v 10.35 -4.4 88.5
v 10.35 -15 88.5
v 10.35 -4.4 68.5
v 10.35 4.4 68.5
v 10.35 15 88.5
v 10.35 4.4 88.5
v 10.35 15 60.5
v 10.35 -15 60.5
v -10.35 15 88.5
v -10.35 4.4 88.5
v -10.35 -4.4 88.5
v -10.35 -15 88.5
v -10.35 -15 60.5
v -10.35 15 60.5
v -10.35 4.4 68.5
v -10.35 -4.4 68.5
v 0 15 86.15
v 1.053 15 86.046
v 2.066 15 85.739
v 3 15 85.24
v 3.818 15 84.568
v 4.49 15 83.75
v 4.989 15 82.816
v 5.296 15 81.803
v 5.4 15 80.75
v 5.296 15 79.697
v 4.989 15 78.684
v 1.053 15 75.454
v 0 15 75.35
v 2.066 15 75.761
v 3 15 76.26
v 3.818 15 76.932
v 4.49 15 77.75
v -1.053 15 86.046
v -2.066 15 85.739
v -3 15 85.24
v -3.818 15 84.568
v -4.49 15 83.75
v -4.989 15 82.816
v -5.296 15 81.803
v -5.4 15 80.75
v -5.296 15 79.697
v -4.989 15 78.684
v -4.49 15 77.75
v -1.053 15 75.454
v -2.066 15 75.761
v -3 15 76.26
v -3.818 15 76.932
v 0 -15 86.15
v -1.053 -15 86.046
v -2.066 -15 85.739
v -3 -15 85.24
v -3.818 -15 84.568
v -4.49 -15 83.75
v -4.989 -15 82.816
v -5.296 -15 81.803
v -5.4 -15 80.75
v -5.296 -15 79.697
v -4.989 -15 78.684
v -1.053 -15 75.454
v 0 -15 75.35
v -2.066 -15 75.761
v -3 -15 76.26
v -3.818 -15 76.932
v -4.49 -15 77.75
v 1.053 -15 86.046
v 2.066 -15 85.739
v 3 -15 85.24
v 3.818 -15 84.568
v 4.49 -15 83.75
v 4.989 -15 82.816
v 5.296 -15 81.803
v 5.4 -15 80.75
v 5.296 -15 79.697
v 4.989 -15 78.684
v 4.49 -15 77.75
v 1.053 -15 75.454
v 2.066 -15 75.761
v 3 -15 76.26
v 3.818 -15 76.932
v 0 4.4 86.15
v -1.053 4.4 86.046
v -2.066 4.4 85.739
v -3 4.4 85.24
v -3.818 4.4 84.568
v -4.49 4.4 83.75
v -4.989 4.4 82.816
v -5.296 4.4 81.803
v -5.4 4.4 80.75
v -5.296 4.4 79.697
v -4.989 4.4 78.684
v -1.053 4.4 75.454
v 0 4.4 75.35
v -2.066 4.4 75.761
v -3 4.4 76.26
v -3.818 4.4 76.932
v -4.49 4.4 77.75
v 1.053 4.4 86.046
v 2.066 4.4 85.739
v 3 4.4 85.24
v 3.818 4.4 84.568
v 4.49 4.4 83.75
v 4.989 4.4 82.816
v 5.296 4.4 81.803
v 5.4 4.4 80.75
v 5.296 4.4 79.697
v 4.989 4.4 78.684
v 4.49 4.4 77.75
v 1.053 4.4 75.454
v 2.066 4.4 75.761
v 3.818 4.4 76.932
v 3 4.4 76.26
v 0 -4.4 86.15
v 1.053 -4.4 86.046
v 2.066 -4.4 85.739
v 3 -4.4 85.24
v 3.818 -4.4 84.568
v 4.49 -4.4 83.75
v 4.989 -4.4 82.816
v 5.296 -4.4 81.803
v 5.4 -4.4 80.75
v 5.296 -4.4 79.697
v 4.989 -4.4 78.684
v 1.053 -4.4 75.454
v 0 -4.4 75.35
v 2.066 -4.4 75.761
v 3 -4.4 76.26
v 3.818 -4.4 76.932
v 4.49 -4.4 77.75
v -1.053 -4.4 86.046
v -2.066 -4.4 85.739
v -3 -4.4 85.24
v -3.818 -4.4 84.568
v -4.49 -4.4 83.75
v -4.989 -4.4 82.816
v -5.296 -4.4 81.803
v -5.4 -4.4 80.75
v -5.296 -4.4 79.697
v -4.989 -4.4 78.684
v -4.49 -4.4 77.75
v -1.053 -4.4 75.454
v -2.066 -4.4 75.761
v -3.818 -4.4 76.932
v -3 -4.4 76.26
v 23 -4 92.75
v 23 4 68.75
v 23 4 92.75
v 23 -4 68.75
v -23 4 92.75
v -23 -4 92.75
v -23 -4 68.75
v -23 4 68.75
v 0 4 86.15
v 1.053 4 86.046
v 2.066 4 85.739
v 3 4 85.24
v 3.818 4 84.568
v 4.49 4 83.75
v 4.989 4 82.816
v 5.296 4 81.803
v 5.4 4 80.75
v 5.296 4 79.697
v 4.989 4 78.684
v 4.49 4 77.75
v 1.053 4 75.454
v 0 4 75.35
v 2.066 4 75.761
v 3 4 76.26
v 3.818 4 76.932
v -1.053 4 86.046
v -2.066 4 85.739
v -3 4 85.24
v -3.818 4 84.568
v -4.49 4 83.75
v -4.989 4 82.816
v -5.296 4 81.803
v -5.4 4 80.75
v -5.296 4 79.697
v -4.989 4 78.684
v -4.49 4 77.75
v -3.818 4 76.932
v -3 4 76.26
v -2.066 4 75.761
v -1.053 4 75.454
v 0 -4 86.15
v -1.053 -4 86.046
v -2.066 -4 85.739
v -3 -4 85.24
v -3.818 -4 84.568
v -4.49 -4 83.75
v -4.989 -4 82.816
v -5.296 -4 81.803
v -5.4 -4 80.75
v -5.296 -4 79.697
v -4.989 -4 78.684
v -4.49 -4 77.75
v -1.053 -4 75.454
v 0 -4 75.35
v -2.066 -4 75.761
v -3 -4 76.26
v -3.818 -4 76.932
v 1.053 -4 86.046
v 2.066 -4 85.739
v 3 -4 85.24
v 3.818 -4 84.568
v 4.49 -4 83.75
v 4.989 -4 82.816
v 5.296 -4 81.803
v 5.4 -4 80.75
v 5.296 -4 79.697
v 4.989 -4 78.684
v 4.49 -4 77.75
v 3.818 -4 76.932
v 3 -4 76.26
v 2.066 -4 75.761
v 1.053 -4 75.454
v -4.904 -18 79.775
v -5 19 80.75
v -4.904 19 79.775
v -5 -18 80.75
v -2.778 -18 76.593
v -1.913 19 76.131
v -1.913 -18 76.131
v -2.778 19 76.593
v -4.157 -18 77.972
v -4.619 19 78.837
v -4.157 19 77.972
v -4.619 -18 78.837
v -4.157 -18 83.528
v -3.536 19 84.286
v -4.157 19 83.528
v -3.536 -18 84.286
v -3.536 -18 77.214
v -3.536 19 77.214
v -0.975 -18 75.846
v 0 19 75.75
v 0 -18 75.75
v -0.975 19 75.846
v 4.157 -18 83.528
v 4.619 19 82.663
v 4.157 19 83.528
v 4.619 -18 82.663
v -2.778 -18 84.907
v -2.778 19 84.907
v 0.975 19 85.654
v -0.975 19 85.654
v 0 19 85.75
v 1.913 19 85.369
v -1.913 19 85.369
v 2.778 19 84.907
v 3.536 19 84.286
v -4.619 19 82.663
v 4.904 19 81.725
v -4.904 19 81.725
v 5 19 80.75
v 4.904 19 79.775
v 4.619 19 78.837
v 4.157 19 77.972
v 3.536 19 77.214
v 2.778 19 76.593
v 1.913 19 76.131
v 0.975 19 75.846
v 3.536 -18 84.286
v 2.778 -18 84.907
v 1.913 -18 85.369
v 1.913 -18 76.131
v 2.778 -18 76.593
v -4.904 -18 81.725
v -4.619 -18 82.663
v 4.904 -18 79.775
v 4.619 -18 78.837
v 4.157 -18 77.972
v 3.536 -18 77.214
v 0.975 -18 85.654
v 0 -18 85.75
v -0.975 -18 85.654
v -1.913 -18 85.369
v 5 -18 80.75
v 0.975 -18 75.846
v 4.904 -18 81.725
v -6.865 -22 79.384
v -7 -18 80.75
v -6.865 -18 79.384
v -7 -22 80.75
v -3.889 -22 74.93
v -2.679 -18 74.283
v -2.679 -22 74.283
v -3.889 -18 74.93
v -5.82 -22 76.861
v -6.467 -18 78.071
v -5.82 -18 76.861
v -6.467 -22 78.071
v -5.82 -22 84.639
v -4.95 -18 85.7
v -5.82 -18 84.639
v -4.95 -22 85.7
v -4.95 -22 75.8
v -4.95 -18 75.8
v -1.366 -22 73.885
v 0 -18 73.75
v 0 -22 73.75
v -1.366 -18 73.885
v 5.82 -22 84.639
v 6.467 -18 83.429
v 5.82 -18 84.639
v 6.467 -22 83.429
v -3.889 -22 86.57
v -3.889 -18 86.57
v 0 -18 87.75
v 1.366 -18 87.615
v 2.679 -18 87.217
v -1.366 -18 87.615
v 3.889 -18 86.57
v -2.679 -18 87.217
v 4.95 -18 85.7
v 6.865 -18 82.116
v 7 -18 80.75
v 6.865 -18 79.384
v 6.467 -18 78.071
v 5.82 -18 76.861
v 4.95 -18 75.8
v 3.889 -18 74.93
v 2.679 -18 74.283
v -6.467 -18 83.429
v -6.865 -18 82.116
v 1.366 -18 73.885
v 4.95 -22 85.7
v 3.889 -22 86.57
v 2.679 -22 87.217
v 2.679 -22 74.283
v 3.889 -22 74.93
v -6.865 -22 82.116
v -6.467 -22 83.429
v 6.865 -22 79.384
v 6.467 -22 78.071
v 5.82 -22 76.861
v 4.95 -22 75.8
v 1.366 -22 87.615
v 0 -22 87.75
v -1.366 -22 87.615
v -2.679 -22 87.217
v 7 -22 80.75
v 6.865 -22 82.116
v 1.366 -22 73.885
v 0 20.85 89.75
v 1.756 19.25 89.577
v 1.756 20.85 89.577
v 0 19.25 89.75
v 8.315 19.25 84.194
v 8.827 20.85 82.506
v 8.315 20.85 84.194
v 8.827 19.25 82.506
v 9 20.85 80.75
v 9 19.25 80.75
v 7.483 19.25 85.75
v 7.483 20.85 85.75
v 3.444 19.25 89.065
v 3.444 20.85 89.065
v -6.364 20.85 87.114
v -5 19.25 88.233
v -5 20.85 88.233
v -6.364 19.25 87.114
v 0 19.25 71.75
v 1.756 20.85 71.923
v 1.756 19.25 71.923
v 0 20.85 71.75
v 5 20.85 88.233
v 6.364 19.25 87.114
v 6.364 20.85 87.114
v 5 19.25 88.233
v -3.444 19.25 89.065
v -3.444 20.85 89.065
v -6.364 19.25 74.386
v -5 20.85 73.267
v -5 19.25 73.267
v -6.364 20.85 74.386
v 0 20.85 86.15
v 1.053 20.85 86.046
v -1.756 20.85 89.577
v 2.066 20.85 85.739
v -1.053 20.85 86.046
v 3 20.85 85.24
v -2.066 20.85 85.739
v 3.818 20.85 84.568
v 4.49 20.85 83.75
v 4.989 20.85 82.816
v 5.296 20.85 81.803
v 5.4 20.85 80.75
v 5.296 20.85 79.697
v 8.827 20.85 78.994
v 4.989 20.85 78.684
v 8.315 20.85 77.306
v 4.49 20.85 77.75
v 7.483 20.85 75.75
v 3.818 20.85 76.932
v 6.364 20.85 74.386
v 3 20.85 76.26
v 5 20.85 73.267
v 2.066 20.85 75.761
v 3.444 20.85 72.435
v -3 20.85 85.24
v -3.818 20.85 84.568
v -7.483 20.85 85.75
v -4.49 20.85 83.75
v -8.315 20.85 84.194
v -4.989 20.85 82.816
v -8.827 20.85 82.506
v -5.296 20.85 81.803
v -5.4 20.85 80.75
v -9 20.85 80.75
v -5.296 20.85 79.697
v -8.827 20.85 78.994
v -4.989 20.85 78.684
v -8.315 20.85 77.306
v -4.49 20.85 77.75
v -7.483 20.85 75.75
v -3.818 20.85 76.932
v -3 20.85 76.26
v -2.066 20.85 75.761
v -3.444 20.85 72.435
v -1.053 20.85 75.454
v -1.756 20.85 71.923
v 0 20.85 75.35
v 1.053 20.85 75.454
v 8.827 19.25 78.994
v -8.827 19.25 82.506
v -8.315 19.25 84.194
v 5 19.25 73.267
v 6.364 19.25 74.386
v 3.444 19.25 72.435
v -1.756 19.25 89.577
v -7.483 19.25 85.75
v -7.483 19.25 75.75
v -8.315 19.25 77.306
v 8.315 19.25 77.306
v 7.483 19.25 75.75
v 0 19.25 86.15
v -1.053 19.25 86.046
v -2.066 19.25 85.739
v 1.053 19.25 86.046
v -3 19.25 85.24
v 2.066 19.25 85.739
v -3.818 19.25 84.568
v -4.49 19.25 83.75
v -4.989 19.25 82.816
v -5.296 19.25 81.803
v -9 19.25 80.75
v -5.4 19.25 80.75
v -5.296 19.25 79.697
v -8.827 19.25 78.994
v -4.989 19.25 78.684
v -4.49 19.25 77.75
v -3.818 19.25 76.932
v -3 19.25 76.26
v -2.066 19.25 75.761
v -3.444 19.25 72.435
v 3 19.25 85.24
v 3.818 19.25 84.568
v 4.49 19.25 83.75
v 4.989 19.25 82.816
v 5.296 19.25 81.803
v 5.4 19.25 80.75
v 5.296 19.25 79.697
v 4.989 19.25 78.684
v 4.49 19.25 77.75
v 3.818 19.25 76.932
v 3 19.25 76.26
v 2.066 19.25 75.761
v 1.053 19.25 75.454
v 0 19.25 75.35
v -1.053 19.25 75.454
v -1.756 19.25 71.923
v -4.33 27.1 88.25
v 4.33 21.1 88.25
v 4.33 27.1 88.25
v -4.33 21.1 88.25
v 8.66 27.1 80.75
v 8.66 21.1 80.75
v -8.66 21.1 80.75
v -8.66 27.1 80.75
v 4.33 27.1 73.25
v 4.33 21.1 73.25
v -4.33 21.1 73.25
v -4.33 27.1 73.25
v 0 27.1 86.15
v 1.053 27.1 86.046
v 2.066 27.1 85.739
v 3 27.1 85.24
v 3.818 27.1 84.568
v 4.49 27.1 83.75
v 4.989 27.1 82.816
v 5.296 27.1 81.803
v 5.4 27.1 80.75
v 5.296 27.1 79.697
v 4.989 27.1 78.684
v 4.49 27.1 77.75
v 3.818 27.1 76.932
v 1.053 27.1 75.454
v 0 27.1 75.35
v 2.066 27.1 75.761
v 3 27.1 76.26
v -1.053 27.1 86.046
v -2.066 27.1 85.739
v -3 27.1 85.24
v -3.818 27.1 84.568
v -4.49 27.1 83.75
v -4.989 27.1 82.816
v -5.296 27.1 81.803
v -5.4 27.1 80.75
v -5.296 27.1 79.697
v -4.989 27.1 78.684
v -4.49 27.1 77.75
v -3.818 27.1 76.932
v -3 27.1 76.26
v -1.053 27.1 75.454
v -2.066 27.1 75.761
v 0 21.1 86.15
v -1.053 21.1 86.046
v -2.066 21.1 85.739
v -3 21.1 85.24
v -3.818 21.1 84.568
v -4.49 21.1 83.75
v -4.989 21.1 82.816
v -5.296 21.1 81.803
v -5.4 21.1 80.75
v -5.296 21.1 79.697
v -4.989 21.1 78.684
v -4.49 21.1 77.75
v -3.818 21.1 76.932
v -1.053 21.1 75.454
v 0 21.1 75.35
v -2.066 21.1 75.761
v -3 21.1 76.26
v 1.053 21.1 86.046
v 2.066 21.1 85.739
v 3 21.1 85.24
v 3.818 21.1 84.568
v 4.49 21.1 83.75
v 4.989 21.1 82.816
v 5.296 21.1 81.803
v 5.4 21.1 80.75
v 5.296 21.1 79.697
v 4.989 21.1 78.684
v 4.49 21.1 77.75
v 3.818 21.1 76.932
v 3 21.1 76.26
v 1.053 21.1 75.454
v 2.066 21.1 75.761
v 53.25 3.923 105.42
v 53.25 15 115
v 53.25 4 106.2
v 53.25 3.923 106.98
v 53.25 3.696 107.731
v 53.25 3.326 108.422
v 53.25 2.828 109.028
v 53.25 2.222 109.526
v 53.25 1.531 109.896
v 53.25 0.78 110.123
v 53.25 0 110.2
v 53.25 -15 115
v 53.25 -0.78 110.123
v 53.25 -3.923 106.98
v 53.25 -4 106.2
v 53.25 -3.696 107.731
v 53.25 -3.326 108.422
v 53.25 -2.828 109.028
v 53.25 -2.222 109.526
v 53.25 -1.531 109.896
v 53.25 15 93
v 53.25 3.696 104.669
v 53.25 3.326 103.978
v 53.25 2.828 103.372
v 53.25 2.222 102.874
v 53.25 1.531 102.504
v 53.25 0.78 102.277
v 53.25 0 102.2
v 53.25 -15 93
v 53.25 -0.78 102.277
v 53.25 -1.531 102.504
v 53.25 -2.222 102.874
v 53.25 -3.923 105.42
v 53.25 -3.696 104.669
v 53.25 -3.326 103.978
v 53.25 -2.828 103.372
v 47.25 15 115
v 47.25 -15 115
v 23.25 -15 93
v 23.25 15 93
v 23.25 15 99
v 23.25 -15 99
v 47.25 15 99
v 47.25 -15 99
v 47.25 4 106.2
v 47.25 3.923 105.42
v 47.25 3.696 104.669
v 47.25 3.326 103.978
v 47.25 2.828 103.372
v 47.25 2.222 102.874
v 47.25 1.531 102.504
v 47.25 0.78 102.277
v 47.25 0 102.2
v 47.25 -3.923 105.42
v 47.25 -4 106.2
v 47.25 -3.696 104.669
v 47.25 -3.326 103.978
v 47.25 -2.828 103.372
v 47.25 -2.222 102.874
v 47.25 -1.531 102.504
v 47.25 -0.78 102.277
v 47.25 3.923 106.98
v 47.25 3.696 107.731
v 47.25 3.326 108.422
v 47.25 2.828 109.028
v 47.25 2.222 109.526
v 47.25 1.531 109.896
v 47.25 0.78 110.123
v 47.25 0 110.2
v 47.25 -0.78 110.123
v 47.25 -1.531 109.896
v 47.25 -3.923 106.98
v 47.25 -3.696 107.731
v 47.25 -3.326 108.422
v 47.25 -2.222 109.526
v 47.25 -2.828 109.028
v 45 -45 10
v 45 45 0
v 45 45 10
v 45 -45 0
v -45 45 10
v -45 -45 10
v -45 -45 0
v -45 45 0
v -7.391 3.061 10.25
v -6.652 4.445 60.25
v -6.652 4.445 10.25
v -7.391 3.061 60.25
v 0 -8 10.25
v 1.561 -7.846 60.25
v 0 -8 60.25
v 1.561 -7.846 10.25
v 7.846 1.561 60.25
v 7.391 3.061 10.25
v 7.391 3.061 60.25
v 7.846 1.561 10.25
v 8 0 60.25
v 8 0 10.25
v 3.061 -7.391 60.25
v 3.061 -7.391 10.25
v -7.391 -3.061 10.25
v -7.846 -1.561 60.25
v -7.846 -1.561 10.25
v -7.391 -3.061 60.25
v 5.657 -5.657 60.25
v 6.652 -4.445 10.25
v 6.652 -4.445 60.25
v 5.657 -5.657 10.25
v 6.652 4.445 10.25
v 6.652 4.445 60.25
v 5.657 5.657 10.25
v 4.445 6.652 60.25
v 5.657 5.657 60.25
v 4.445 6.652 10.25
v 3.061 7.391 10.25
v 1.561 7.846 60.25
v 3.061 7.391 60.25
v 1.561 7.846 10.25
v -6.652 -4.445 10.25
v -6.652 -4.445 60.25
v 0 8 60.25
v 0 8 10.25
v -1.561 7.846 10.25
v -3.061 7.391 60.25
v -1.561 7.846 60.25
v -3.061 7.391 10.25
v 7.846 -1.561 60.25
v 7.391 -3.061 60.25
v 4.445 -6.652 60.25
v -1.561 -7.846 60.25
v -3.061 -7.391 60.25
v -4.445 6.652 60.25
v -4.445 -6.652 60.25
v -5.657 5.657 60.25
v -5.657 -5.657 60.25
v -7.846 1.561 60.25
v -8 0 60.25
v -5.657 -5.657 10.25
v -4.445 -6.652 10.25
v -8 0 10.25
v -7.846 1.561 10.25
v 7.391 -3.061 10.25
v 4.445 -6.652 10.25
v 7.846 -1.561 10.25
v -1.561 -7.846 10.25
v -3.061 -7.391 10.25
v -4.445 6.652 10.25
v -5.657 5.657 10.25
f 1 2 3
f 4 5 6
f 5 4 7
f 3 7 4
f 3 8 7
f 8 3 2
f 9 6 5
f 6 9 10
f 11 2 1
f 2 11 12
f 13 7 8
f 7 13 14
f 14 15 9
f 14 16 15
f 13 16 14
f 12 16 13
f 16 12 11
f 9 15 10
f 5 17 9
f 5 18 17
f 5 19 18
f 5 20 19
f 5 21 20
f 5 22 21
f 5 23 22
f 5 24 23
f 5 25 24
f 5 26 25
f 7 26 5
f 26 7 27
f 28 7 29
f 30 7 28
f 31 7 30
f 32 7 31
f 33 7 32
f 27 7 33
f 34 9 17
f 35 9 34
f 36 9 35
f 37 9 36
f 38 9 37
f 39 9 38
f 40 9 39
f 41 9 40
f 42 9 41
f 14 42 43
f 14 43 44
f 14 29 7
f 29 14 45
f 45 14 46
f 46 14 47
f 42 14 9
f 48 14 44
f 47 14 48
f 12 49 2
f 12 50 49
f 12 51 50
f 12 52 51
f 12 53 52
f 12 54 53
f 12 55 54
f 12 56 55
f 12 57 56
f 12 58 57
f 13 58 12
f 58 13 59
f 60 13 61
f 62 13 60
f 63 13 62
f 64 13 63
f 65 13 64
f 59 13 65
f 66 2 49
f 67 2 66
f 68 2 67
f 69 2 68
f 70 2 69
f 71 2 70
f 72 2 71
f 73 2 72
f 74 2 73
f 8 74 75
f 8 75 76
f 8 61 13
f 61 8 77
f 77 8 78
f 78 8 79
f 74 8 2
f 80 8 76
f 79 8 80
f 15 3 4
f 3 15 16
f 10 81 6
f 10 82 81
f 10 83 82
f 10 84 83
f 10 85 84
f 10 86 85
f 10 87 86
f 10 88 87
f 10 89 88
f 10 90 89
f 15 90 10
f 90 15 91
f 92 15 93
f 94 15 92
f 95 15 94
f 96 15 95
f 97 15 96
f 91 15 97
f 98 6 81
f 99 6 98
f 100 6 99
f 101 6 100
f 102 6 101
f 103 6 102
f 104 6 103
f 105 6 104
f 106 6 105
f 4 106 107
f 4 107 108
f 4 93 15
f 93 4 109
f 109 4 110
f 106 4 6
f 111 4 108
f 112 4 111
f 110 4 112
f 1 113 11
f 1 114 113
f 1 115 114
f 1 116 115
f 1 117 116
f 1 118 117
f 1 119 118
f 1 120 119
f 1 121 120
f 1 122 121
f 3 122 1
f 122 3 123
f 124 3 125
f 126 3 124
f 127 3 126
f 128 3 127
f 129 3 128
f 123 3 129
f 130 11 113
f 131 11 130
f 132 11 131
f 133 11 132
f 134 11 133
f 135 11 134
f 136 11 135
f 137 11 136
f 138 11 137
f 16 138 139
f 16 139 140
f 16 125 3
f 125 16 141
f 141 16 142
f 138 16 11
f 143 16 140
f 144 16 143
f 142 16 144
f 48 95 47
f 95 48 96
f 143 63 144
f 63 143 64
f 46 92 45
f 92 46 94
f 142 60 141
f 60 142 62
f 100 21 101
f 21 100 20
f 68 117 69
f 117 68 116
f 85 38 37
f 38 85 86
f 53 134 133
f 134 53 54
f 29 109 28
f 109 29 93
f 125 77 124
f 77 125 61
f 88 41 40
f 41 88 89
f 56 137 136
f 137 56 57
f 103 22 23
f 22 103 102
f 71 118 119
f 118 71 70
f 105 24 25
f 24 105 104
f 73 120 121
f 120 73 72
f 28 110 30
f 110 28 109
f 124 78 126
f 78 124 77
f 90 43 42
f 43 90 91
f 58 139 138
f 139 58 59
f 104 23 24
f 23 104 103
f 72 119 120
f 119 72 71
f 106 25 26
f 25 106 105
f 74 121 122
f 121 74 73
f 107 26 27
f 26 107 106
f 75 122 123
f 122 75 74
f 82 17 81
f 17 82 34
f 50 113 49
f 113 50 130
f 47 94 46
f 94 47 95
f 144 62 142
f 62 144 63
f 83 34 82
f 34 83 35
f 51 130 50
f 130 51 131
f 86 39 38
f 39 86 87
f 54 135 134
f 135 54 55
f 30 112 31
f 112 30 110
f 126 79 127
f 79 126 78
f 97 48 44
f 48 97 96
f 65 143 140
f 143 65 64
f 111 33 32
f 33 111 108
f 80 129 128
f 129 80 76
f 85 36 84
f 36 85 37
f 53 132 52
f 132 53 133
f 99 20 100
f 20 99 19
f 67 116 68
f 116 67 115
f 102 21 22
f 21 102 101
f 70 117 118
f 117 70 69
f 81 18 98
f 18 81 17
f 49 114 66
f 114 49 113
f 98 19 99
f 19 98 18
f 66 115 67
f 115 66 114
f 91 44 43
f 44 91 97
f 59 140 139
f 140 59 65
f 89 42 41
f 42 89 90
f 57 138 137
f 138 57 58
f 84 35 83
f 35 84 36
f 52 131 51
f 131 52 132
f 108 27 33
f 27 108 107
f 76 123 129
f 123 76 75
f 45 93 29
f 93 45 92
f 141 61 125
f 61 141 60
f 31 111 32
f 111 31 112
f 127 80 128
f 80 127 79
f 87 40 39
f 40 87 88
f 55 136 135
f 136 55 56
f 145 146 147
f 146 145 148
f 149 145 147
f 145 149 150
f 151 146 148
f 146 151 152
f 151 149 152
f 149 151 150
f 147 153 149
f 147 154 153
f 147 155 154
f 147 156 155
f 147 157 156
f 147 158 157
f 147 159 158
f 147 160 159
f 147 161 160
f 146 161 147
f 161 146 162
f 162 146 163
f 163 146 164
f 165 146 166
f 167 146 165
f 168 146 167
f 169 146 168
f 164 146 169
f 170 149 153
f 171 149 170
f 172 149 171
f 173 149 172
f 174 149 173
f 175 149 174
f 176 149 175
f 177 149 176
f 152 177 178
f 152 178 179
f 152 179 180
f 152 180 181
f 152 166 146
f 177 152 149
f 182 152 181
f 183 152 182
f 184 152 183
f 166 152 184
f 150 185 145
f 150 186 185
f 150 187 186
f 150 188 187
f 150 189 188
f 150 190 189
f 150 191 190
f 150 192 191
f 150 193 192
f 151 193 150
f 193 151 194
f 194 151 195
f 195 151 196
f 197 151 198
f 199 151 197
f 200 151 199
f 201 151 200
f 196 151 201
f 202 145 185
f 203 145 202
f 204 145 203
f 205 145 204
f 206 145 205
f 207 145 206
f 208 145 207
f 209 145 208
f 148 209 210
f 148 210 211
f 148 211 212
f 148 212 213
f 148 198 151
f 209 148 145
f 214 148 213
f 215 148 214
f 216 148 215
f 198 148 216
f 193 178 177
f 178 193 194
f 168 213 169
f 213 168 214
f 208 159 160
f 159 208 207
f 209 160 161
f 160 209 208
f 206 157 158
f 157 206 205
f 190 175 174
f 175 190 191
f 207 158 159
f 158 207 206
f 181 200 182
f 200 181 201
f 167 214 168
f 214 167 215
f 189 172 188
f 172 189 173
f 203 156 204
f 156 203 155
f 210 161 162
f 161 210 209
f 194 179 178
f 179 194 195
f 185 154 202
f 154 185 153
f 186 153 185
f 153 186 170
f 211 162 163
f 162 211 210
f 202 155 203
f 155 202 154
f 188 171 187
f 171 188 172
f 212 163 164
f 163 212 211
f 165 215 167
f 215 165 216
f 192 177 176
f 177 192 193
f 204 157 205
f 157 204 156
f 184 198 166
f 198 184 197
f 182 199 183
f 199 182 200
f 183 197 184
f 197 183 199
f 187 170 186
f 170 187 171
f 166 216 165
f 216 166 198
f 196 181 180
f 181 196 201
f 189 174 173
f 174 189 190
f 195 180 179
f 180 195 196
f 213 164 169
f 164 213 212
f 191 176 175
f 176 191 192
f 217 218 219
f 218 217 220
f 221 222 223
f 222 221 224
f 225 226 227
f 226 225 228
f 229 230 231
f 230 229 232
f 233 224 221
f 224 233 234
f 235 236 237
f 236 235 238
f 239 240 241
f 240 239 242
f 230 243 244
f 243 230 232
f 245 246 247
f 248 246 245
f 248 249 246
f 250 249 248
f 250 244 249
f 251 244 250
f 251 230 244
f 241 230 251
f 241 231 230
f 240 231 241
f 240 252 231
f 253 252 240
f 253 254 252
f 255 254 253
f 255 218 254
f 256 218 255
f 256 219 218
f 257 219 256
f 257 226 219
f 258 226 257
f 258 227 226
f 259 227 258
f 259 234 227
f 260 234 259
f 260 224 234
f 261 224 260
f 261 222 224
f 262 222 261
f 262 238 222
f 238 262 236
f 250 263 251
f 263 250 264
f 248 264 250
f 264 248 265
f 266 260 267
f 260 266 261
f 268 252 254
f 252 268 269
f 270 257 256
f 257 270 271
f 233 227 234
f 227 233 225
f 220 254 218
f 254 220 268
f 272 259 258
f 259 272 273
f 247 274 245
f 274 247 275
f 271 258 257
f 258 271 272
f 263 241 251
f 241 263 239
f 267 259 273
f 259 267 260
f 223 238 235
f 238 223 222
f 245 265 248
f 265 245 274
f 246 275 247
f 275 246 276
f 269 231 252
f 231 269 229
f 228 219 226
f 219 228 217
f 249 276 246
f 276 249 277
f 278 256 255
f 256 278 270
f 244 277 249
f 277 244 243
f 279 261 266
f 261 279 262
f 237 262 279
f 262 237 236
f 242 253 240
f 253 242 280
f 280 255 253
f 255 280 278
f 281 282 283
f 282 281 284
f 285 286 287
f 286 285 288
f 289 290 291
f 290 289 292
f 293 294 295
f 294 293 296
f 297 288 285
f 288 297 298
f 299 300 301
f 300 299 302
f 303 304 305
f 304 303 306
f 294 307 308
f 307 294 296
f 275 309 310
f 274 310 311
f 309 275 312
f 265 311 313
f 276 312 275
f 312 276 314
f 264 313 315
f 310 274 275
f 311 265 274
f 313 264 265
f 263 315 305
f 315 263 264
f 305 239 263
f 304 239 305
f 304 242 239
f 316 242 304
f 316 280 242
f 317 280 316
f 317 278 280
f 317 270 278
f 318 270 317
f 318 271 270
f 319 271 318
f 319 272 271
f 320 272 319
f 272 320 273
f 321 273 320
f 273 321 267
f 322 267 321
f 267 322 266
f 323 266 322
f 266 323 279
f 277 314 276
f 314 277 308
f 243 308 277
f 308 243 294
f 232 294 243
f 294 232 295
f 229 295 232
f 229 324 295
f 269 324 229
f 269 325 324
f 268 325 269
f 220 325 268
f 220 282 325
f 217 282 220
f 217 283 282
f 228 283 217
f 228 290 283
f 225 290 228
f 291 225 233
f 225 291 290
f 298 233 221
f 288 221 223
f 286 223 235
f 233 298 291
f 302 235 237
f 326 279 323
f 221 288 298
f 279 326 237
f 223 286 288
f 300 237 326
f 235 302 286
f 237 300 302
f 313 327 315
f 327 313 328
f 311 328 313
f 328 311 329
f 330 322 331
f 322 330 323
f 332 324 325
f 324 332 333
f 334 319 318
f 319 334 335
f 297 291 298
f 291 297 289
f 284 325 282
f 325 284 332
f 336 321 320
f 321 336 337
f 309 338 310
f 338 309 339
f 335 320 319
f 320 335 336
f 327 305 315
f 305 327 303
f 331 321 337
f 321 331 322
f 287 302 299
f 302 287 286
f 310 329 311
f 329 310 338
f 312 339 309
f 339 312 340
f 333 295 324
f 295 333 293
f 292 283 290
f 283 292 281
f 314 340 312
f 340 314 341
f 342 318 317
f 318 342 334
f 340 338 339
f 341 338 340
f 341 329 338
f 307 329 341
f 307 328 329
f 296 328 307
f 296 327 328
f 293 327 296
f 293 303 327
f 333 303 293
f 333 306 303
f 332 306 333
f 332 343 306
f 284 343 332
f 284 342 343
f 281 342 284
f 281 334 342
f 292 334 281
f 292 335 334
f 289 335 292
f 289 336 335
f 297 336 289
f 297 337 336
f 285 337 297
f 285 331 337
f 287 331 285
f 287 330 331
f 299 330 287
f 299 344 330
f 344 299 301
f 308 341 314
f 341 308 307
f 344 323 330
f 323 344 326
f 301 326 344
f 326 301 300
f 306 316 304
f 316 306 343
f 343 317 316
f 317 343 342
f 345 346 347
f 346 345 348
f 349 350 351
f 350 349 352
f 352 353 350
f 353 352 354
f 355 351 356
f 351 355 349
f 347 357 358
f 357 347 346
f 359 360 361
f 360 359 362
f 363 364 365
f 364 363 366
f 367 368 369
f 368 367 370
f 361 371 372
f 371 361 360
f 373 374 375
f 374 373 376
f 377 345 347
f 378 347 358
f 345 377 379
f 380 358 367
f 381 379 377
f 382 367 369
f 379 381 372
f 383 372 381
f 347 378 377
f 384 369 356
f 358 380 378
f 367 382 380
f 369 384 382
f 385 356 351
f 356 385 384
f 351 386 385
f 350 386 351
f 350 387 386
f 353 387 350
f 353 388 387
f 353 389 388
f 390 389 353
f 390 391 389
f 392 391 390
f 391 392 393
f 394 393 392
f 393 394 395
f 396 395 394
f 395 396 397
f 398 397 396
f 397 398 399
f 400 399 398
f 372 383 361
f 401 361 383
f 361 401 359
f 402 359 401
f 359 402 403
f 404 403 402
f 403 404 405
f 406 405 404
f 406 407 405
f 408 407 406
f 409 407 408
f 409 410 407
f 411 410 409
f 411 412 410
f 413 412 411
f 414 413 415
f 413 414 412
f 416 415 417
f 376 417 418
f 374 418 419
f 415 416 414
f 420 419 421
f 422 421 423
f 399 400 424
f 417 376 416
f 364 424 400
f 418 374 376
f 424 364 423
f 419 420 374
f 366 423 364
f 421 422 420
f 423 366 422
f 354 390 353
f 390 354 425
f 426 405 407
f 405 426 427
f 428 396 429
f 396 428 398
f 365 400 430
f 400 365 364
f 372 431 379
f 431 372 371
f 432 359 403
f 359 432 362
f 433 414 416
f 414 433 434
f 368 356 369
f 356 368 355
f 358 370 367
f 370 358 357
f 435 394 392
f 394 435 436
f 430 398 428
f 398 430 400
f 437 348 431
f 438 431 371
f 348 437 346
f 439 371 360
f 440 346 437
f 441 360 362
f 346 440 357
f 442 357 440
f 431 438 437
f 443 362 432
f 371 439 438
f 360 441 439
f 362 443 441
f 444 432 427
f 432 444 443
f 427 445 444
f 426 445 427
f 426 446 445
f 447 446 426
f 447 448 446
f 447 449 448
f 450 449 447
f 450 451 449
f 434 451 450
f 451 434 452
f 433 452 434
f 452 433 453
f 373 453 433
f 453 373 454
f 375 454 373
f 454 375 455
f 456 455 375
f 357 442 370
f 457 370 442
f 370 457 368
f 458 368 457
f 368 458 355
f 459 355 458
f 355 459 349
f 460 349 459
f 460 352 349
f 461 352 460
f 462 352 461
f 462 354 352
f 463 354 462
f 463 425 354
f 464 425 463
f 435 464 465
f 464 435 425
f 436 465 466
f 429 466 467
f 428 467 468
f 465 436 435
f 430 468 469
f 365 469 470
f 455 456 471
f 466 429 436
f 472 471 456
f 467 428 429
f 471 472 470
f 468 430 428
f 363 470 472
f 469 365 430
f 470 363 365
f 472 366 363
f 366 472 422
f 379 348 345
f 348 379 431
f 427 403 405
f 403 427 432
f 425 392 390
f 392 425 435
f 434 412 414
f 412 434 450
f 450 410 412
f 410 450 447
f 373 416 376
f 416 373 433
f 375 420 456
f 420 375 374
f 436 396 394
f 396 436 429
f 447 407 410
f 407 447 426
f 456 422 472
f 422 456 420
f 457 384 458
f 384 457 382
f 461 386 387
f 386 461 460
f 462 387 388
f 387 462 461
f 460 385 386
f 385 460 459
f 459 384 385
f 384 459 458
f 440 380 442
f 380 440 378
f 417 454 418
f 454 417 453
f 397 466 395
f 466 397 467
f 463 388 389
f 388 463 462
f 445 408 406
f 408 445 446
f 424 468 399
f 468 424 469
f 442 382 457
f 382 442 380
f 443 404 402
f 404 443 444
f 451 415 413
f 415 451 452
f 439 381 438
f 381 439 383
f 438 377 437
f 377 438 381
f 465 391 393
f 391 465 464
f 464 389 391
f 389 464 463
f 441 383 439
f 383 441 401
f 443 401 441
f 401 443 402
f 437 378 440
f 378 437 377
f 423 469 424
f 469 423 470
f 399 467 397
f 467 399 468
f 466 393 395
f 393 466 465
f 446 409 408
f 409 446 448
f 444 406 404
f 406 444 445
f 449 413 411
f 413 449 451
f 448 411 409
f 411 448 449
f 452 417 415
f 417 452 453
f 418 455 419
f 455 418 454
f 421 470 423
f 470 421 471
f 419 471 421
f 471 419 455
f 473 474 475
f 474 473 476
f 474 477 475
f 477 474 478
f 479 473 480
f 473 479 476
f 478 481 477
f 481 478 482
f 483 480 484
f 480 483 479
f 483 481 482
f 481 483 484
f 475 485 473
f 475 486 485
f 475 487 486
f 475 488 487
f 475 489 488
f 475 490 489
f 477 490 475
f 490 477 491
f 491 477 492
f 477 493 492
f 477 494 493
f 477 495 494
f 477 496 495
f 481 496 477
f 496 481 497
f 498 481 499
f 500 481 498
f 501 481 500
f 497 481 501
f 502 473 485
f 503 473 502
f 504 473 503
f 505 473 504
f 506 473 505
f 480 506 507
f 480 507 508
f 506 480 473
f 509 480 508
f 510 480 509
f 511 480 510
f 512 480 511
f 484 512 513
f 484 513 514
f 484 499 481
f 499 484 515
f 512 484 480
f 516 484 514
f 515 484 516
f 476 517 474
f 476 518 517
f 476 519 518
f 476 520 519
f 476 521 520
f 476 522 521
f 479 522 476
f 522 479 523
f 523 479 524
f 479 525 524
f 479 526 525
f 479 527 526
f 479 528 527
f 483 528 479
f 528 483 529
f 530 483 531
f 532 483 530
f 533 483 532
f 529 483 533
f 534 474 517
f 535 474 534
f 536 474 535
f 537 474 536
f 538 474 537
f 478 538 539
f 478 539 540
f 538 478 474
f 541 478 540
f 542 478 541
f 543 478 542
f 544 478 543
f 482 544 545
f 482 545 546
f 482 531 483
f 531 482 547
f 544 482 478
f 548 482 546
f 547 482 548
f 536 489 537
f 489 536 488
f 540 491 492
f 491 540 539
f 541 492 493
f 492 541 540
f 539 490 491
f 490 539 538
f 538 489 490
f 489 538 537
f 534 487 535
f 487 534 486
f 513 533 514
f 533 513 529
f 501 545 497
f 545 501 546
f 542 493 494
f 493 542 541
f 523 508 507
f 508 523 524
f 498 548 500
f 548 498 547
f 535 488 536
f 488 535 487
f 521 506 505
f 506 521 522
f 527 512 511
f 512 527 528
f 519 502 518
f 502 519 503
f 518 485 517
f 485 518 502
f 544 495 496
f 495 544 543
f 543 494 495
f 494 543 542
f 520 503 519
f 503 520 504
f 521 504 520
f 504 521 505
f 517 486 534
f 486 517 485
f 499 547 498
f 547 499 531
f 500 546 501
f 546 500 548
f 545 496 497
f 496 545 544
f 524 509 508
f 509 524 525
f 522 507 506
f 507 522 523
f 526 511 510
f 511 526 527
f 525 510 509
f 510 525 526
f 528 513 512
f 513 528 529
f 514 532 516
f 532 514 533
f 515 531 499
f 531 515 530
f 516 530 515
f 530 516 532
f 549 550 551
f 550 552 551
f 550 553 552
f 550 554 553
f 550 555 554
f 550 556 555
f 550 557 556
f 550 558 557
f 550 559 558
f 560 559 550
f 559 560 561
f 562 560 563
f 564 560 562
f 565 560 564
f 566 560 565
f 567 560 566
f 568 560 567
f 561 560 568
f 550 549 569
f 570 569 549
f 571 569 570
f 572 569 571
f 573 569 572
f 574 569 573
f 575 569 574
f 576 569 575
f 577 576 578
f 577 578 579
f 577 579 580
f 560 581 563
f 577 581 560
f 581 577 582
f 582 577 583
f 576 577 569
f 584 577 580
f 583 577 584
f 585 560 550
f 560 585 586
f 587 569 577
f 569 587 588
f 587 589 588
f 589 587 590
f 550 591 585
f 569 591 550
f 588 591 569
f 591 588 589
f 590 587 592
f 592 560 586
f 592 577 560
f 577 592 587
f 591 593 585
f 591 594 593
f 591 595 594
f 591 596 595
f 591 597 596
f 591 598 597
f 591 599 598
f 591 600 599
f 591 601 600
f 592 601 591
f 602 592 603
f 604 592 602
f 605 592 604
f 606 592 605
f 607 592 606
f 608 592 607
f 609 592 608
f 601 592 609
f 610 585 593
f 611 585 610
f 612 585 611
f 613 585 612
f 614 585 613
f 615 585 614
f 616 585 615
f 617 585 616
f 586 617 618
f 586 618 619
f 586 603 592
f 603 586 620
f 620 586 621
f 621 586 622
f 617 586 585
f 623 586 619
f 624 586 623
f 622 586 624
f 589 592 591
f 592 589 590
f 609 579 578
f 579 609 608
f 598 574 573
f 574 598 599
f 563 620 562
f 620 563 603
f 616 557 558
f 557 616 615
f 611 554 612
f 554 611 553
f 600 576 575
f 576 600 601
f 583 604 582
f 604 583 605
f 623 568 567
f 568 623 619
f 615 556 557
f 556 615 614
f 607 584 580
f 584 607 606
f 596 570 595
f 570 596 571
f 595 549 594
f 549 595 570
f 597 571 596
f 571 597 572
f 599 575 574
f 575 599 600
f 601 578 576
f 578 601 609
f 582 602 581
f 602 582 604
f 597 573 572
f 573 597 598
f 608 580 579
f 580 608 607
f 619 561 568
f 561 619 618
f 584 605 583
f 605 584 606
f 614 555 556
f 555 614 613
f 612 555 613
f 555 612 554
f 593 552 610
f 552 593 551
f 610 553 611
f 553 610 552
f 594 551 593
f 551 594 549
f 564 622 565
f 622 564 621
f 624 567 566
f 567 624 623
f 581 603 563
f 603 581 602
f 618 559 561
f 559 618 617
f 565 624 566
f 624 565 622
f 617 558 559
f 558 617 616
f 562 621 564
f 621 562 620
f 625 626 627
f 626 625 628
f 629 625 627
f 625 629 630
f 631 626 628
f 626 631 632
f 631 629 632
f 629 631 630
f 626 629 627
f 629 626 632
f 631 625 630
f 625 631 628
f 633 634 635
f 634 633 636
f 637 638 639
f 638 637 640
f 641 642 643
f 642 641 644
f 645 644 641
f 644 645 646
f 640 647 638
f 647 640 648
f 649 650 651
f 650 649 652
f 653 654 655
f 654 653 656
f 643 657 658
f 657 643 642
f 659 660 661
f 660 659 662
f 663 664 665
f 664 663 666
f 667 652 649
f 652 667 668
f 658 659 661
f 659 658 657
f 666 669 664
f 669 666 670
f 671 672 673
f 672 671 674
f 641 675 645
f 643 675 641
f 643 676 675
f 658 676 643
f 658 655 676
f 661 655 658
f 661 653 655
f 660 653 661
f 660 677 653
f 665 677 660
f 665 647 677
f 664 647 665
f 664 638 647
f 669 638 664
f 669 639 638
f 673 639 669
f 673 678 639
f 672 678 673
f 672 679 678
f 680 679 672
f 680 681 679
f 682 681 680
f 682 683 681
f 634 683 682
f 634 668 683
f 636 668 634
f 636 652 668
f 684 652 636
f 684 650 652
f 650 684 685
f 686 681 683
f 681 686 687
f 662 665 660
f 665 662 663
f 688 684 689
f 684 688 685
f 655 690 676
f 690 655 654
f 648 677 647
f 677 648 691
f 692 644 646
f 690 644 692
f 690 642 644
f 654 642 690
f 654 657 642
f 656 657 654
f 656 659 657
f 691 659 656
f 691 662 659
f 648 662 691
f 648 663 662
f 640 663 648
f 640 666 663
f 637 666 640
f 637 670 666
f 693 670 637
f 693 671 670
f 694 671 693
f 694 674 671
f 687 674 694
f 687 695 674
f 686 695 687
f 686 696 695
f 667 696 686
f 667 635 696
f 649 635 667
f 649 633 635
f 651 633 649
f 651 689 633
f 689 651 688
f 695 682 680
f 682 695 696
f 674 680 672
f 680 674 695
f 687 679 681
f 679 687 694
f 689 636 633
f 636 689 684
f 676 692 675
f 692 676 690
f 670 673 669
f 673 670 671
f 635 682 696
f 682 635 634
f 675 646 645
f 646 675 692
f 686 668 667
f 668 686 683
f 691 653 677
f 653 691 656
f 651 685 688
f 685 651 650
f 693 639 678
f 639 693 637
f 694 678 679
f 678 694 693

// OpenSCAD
$fn = 32;

// ------------------------------------------------------------------------
// Lamp arm: column d16 x 50 mm, arm 46 mm
// Every part is its own module, assembly() places every instance.
// ------------------------------------------------------------------------

// --- part 1 ---
module lamp_base() {
  difference() {
    translate([-45, -45, 0]) cube([90, 90, 10]);
  }
}

// --- part 2 ---
module lamp_column() {
  cylinder(h = 50, d = 16);
}

// --- part 3 ---
module head_fork() {
  difference() {
    translate([-10.35, -15, 0]) cube([20.7, 30, 28]);
    translate([-11.35, -4.4, 8]) cube([22.7, 8.8, 21]);
    translate([0, 0, 20.25]) rotate([90, 0, 0]) cylinder(h = 32, d = 10.8, center = true);
  }
}

// --- part 4 ---
module lamp_arm() {
  difference() {
    translate([-23, -4, 0]) cube([46, 8, 24]);
    translate([0, 0, 12]) rotate([90, 0, 0]) cylinder(h = 10, d = 10.8, center = true);
  }
}

// --- part 5 ---
module arm_pin() {
  rotate([0, 90, 0]) cylinder(h = 38, d = 10, center = true);
  translate([-22, 0, 0]) rotate([0, 90, 0]) cylinder(h = 4, d = 14);
}

// --- part 6 ---
module arm_washer() {
  difference() {
      translate([0, 0, 0]) cylinder(h = 1.6, d = 18);
      translate([0, 0, -1]) cylinder(h = 3.6, d = 10.8);
    }
}

// --- part 7 ---
module arm_nut() {
  difference() {
    linear_extrude(height = 6) polygon(points = [[8.66, 0], [4.33, 7.5], [-4.33, 7.5], [-8.66, 0], [-4.33, -7.5], [4.33, -7.5]]);
    translate([0, 0, -1]) cylinder(h = 8, d = 10.8);
  }
}

// --- part 8 ---
module shade_bracket() {
  difference() {
    translate([-15, -15, 0]) cube([30, 30, 22]);
    translate([-16, -16, 6]) cube([25, 32, 17]);
    translate([12, 0, 13.2]) rotate([0, 90, 0]) cylinder(h = 8, d = 8, center = true);
  }
}

// --- assembly ---
module assembly() {
  color([0.80, 0.24, 0.20]) translate([0, 0, 0]) rotate([0, 0, 0]) lamp_base();
  color([0.20, 0.45, 0.75]) translate([0, 0, 10.25]) rotate([0, 0, 0]) lamp_column();
  color([0.25, 0.62, 0.32]) translate([0, 0, 60.5]) rotate([0, 0, 0]) head_fork();
  color([0.92, 0.70, 0.18]) translate([0, 0, 68.75]) rotate([0, 0, 0]) lamp_arm();
  color([0.58, 0.35, 0.70]) translate([0, 0, 80.75]) rotate([0, 0, 90]) arm_pin();
  color([0.16, 0.66, 0.66]) translate([0, 20.85, 80.75]) rotate([90, 0, 0]) arm_washer();
  color([0.85, 0.48, 0.18]) translate([0, 27.1, 80.75]) rotate([90, 0, 0]) arm_nut();
  color([0.55, 0.60, 0.65]) translate([38.25, 0, 93]) rotate([0, 0, 0]) shade_bracket();
}

assembly();
